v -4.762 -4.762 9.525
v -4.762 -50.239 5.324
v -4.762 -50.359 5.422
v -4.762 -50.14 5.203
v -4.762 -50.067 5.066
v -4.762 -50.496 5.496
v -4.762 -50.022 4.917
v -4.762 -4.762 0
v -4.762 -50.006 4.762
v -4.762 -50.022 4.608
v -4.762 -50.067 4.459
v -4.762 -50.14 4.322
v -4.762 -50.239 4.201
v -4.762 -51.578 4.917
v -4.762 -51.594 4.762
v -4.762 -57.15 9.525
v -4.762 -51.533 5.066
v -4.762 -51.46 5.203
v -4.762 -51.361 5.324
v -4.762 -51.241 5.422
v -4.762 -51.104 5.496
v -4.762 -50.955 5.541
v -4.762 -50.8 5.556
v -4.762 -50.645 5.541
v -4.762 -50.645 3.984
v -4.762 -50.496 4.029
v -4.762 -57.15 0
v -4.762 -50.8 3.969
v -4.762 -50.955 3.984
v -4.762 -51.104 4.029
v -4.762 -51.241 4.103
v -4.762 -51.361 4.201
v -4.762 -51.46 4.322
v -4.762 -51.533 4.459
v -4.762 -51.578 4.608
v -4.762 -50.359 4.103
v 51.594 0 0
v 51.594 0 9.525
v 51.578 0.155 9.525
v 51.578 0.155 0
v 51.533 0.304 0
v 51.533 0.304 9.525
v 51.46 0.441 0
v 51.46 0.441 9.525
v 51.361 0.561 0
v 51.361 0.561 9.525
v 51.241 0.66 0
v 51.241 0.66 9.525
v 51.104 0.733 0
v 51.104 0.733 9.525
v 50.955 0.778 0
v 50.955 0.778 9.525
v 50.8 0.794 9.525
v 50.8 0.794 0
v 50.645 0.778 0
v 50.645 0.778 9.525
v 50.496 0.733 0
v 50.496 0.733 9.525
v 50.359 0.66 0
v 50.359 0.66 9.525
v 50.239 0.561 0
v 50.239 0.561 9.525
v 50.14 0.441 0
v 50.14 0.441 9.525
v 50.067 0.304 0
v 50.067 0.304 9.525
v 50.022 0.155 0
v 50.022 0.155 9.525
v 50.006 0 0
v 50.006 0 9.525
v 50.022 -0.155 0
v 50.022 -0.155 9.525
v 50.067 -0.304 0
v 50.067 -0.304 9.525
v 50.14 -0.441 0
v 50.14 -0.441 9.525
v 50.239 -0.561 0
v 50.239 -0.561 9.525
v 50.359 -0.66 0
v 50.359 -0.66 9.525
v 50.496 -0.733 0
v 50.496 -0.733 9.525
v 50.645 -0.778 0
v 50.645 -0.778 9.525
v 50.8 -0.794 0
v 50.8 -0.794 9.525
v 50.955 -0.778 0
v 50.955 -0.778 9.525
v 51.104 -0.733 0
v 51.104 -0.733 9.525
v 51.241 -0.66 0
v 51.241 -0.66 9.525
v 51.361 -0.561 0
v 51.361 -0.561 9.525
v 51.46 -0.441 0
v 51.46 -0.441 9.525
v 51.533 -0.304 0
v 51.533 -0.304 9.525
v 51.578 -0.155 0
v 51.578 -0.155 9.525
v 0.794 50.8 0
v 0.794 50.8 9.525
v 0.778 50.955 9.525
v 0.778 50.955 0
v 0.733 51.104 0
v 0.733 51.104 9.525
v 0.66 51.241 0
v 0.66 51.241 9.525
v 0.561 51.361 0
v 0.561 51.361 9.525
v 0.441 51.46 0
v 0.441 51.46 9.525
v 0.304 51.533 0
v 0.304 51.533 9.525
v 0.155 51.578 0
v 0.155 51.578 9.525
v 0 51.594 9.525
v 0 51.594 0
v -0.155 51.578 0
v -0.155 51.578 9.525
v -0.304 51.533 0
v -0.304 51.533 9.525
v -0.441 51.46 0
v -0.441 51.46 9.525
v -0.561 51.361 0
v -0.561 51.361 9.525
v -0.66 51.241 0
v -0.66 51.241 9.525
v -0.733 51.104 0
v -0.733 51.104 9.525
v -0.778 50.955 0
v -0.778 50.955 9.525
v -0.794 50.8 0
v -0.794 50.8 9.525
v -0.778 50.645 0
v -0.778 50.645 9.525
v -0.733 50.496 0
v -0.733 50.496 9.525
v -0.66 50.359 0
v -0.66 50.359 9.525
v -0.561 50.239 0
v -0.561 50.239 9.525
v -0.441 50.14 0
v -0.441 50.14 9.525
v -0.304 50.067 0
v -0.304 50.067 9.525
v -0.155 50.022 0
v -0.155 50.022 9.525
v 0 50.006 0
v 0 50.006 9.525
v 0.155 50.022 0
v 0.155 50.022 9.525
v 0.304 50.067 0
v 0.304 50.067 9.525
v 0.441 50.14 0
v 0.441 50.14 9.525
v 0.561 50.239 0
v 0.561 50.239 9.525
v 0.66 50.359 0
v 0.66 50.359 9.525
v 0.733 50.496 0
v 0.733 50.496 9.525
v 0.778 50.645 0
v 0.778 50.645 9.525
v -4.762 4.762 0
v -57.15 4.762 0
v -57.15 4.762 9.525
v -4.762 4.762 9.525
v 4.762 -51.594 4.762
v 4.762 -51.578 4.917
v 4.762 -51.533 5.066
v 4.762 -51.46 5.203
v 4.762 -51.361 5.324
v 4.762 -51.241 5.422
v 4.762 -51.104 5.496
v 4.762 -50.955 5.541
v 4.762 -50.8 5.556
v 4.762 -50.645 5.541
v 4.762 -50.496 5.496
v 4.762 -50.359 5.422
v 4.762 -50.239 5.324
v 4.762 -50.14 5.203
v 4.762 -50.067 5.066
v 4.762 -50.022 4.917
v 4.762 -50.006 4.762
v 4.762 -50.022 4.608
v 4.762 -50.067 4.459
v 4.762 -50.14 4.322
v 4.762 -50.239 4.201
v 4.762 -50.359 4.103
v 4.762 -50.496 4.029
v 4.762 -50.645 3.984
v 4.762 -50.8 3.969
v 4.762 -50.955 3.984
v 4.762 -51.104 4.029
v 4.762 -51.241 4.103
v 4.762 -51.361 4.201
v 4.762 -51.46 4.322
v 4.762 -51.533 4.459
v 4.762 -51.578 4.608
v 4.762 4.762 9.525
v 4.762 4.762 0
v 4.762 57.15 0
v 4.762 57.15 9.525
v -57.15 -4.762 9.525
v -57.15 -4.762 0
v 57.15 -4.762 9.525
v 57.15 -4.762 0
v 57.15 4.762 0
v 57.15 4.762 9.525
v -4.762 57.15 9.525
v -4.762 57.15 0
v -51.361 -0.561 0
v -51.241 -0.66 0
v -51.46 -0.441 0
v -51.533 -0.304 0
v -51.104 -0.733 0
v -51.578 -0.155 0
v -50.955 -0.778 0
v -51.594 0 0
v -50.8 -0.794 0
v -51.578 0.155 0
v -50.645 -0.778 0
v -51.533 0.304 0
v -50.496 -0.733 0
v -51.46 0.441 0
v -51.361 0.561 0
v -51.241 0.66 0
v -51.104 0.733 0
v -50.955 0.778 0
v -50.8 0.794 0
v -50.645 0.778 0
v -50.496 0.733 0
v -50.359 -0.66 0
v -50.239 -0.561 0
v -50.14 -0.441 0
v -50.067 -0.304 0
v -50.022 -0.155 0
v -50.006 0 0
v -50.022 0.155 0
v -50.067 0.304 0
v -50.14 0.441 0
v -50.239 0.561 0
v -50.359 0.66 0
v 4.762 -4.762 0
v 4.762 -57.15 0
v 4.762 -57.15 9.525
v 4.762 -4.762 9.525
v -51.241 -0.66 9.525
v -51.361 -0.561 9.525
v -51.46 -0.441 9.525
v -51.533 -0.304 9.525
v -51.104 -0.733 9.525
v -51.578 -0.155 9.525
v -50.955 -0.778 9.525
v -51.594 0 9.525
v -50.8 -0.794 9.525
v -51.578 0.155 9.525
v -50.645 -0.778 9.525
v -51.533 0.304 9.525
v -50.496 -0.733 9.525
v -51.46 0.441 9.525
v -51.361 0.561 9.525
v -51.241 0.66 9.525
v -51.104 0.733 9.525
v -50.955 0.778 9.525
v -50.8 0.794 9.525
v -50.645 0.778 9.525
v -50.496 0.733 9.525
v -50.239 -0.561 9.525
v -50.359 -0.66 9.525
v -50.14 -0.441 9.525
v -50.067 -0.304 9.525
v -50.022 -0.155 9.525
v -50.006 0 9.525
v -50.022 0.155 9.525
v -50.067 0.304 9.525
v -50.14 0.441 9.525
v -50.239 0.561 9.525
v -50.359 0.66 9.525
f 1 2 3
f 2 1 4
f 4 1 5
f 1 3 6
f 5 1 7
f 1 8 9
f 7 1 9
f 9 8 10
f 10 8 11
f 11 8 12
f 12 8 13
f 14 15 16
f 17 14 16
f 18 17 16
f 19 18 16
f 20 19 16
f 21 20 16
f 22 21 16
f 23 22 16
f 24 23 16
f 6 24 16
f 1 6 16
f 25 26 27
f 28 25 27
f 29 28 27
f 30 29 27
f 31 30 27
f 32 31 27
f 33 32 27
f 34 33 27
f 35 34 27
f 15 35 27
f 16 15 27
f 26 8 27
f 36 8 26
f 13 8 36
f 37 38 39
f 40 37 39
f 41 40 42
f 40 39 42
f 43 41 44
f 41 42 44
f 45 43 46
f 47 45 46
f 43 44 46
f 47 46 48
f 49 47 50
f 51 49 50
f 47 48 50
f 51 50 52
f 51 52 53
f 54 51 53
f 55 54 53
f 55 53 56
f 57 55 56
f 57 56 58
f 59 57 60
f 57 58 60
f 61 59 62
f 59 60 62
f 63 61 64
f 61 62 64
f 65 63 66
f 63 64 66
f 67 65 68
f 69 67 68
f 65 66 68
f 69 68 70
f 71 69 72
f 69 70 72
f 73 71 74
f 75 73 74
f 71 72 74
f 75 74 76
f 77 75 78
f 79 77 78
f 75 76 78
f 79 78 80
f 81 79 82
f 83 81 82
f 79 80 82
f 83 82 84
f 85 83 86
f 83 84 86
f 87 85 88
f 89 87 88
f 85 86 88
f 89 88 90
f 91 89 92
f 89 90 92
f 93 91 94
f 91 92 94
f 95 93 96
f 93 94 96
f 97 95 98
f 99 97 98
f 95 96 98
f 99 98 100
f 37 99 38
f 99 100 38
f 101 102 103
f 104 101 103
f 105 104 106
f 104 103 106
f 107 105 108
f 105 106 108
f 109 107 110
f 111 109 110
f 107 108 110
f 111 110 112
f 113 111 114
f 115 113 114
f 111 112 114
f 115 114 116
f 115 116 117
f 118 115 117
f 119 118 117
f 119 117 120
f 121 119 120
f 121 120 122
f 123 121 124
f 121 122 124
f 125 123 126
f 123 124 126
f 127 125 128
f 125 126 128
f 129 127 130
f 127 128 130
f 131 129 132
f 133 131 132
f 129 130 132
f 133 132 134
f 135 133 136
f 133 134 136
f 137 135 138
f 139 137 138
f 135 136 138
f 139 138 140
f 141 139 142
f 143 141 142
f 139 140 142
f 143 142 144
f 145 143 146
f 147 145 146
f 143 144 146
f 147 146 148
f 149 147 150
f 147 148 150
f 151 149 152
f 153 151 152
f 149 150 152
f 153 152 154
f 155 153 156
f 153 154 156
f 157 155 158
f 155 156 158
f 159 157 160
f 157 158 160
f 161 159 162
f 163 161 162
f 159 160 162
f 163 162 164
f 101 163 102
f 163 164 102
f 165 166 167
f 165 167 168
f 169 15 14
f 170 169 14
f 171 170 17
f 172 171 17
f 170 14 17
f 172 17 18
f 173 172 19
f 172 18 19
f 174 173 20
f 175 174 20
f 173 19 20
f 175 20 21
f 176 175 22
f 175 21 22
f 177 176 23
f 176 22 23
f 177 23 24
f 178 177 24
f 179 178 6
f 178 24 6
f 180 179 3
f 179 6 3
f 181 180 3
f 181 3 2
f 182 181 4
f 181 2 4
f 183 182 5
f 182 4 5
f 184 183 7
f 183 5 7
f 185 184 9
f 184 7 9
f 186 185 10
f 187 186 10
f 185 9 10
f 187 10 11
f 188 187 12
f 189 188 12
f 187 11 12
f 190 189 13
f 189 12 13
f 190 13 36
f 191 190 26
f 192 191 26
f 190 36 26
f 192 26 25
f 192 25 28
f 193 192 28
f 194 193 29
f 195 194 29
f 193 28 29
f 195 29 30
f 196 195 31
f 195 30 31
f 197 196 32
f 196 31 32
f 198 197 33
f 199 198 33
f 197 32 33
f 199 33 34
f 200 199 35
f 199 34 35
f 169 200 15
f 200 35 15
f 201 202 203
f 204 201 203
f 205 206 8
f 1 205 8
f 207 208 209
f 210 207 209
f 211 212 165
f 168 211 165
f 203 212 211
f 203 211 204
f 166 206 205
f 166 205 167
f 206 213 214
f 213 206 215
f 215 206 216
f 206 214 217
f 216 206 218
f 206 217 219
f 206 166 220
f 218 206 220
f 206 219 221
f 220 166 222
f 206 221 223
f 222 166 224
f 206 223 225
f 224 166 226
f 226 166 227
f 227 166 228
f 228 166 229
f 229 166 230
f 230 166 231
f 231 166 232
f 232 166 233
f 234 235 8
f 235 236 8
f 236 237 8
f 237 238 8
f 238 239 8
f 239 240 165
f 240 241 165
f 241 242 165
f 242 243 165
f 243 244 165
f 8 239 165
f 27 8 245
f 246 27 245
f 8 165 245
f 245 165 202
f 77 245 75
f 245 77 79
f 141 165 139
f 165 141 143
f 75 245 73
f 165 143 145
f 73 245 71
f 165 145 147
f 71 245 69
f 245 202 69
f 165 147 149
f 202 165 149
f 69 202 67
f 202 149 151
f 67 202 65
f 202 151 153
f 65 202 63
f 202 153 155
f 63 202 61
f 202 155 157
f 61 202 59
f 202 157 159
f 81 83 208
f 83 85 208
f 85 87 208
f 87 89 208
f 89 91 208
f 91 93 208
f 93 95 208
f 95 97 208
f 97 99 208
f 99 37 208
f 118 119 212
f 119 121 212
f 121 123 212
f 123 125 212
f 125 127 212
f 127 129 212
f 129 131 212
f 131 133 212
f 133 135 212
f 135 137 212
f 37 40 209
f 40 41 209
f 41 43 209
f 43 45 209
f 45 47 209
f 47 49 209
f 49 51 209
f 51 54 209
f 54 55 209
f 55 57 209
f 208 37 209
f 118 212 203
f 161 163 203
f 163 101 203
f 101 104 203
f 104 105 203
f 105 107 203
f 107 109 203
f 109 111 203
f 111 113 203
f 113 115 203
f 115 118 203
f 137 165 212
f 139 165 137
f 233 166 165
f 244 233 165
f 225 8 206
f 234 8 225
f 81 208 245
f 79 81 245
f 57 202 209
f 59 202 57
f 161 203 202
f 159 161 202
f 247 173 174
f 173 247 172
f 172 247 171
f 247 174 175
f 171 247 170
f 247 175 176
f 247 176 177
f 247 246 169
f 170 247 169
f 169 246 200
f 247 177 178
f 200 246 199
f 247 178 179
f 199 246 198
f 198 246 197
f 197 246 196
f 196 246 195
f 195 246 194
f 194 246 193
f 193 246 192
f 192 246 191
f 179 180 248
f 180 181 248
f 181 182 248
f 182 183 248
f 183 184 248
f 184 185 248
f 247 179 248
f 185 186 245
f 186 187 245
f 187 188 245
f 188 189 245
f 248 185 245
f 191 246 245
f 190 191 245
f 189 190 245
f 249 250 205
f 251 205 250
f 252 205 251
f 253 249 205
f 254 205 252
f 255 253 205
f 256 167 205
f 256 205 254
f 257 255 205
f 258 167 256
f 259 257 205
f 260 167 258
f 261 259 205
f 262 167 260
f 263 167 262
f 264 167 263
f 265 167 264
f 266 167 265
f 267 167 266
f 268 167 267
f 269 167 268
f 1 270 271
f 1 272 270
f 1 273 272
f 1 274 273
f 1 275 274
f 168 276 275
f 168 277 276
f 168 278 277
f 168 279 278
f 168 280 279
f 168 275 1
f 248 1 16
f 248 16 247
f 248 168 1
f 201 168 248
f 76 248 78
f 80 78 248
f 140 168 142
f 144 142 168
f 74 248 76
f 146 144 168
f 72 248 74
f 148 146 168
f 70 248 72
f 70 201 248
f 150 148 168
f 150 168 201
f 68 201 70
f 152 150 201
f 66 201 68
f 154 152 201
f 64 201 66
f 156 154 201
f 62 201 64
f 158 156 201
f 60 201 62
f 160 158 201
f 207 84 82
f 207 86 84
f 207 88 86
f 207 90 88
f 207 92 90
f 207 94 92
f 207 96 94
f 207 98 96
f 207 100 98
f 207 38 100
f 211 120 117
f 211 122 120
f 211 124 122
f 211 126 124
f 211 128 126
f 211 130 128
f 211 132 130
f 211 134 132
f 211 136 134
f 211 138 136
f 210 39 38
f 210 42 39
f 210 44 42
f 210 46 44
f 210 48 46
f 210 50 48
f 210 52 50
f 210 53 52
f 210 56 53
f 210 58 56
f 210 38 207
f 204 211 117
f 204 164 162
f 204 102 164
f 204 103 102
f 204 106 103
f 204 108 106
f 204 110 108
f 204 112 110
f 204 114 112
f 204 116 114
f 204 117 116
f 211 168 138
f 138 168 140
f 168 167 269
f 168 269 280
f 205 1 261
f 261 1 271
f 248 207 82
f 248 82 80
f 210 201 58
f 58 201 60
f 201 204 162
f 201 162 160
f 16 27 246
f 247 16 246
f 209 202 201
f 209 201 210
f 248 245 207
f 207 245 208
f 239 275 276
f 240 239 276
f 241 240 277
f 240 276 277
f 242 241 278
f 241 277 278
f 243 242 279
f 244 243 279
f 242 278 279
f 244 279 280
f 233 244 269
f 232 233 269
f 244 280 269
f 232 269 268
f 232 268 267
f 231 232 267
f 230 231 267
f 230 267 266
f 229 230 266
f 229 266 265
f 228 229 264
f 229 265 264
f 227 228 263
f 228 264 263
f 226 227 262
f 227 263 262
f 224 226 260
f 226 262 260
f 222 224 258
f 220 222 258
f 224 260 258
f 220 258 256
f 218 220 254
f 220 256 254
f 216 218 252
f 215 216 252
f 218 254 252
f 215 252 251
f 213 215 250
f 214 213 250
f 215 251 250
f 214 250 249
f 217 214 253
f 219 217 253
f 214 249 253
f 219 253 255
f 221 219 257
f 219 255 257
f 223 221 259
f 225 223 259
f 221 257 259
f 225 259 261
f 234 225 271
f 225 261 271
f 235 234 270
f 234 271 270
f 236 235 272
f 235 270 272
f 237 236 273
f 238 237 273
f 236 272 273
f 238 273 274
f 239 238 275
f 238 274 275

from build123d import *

# Parameters (mm, degrees)
F0_W     = 9.525
F0_H     = 52.3875
F0_W_2   = 52.3875
F0_H_2   = 9.525
F1_DEPTH = 9.525
F2_R     = 0.79375
F3_DEPTH = 9.525
F4_R     = 0.79375
F5_DEPTH = 9.525
F6_W     = 64.4
F6_H     = 21
F7_DEPTH = 11.15


# Not quite as in the source:
# - a length typed as a fraction of an inch, garbled in the dataset ("3 / 203.2 mm" for 3/8 in), is restored


with BuildPart() as f1:
    # F0 (on Top) → F1 (new body)
    with BuildSketch(Plane.XY):
        with Locations((0, 30.95625)):
            Rectangle(F0_W, F0_H)
        with Locations((30.95625, 0)):
            Rectangle(F0_W_2, F0_H_2)
        Rectangle(F0_W, F0_H_2)
        with Locations((0, -30.95625)):
            Rectangle(F0_W, F0_H)
        with Locations((-30.95625, 0)):
            Rectangle(F0_W_2, F0_H_2)
    extrude(amount=F1_DEPTH)

    # F2 (on face) → F3 (cut)
    with BuildSketch(Plane.XY.offset(9.525)):
        with Locations((0, 50.8)):
            Circle(F2_R)
        with Locations((50.8, 0)):
            Circle(F2_R)
        with Locations((-50.8, 0)):
            Circle(F2_R)
    extrude(amount=-F3_DEPTH, mode=Mode.SUBTRACT)

    # F4 (on face) → F5 (cut)
    with BuildSketch(Plane(origin=(-4.7625, 0, 0), x_dir=(0, -1, 0), z_dir=(-1, 0, 0))):
        with Locations((50.8, 4.7625)):
            Circle(F4_R)
    extrude(amount=-F5_DEPTH, mode=Mode.SUBTRACT)


with BuildPart() as f7:
    # F6 (on Top) → F7 (new body, symmetric)
    with BuildSketch(Plane.XY):
        with Locations((0, 0.8)):
            Rectangle(F6_W, F6_H)
    extrude(amount=F7_DEPTH, both=True)


solid = f1.part
